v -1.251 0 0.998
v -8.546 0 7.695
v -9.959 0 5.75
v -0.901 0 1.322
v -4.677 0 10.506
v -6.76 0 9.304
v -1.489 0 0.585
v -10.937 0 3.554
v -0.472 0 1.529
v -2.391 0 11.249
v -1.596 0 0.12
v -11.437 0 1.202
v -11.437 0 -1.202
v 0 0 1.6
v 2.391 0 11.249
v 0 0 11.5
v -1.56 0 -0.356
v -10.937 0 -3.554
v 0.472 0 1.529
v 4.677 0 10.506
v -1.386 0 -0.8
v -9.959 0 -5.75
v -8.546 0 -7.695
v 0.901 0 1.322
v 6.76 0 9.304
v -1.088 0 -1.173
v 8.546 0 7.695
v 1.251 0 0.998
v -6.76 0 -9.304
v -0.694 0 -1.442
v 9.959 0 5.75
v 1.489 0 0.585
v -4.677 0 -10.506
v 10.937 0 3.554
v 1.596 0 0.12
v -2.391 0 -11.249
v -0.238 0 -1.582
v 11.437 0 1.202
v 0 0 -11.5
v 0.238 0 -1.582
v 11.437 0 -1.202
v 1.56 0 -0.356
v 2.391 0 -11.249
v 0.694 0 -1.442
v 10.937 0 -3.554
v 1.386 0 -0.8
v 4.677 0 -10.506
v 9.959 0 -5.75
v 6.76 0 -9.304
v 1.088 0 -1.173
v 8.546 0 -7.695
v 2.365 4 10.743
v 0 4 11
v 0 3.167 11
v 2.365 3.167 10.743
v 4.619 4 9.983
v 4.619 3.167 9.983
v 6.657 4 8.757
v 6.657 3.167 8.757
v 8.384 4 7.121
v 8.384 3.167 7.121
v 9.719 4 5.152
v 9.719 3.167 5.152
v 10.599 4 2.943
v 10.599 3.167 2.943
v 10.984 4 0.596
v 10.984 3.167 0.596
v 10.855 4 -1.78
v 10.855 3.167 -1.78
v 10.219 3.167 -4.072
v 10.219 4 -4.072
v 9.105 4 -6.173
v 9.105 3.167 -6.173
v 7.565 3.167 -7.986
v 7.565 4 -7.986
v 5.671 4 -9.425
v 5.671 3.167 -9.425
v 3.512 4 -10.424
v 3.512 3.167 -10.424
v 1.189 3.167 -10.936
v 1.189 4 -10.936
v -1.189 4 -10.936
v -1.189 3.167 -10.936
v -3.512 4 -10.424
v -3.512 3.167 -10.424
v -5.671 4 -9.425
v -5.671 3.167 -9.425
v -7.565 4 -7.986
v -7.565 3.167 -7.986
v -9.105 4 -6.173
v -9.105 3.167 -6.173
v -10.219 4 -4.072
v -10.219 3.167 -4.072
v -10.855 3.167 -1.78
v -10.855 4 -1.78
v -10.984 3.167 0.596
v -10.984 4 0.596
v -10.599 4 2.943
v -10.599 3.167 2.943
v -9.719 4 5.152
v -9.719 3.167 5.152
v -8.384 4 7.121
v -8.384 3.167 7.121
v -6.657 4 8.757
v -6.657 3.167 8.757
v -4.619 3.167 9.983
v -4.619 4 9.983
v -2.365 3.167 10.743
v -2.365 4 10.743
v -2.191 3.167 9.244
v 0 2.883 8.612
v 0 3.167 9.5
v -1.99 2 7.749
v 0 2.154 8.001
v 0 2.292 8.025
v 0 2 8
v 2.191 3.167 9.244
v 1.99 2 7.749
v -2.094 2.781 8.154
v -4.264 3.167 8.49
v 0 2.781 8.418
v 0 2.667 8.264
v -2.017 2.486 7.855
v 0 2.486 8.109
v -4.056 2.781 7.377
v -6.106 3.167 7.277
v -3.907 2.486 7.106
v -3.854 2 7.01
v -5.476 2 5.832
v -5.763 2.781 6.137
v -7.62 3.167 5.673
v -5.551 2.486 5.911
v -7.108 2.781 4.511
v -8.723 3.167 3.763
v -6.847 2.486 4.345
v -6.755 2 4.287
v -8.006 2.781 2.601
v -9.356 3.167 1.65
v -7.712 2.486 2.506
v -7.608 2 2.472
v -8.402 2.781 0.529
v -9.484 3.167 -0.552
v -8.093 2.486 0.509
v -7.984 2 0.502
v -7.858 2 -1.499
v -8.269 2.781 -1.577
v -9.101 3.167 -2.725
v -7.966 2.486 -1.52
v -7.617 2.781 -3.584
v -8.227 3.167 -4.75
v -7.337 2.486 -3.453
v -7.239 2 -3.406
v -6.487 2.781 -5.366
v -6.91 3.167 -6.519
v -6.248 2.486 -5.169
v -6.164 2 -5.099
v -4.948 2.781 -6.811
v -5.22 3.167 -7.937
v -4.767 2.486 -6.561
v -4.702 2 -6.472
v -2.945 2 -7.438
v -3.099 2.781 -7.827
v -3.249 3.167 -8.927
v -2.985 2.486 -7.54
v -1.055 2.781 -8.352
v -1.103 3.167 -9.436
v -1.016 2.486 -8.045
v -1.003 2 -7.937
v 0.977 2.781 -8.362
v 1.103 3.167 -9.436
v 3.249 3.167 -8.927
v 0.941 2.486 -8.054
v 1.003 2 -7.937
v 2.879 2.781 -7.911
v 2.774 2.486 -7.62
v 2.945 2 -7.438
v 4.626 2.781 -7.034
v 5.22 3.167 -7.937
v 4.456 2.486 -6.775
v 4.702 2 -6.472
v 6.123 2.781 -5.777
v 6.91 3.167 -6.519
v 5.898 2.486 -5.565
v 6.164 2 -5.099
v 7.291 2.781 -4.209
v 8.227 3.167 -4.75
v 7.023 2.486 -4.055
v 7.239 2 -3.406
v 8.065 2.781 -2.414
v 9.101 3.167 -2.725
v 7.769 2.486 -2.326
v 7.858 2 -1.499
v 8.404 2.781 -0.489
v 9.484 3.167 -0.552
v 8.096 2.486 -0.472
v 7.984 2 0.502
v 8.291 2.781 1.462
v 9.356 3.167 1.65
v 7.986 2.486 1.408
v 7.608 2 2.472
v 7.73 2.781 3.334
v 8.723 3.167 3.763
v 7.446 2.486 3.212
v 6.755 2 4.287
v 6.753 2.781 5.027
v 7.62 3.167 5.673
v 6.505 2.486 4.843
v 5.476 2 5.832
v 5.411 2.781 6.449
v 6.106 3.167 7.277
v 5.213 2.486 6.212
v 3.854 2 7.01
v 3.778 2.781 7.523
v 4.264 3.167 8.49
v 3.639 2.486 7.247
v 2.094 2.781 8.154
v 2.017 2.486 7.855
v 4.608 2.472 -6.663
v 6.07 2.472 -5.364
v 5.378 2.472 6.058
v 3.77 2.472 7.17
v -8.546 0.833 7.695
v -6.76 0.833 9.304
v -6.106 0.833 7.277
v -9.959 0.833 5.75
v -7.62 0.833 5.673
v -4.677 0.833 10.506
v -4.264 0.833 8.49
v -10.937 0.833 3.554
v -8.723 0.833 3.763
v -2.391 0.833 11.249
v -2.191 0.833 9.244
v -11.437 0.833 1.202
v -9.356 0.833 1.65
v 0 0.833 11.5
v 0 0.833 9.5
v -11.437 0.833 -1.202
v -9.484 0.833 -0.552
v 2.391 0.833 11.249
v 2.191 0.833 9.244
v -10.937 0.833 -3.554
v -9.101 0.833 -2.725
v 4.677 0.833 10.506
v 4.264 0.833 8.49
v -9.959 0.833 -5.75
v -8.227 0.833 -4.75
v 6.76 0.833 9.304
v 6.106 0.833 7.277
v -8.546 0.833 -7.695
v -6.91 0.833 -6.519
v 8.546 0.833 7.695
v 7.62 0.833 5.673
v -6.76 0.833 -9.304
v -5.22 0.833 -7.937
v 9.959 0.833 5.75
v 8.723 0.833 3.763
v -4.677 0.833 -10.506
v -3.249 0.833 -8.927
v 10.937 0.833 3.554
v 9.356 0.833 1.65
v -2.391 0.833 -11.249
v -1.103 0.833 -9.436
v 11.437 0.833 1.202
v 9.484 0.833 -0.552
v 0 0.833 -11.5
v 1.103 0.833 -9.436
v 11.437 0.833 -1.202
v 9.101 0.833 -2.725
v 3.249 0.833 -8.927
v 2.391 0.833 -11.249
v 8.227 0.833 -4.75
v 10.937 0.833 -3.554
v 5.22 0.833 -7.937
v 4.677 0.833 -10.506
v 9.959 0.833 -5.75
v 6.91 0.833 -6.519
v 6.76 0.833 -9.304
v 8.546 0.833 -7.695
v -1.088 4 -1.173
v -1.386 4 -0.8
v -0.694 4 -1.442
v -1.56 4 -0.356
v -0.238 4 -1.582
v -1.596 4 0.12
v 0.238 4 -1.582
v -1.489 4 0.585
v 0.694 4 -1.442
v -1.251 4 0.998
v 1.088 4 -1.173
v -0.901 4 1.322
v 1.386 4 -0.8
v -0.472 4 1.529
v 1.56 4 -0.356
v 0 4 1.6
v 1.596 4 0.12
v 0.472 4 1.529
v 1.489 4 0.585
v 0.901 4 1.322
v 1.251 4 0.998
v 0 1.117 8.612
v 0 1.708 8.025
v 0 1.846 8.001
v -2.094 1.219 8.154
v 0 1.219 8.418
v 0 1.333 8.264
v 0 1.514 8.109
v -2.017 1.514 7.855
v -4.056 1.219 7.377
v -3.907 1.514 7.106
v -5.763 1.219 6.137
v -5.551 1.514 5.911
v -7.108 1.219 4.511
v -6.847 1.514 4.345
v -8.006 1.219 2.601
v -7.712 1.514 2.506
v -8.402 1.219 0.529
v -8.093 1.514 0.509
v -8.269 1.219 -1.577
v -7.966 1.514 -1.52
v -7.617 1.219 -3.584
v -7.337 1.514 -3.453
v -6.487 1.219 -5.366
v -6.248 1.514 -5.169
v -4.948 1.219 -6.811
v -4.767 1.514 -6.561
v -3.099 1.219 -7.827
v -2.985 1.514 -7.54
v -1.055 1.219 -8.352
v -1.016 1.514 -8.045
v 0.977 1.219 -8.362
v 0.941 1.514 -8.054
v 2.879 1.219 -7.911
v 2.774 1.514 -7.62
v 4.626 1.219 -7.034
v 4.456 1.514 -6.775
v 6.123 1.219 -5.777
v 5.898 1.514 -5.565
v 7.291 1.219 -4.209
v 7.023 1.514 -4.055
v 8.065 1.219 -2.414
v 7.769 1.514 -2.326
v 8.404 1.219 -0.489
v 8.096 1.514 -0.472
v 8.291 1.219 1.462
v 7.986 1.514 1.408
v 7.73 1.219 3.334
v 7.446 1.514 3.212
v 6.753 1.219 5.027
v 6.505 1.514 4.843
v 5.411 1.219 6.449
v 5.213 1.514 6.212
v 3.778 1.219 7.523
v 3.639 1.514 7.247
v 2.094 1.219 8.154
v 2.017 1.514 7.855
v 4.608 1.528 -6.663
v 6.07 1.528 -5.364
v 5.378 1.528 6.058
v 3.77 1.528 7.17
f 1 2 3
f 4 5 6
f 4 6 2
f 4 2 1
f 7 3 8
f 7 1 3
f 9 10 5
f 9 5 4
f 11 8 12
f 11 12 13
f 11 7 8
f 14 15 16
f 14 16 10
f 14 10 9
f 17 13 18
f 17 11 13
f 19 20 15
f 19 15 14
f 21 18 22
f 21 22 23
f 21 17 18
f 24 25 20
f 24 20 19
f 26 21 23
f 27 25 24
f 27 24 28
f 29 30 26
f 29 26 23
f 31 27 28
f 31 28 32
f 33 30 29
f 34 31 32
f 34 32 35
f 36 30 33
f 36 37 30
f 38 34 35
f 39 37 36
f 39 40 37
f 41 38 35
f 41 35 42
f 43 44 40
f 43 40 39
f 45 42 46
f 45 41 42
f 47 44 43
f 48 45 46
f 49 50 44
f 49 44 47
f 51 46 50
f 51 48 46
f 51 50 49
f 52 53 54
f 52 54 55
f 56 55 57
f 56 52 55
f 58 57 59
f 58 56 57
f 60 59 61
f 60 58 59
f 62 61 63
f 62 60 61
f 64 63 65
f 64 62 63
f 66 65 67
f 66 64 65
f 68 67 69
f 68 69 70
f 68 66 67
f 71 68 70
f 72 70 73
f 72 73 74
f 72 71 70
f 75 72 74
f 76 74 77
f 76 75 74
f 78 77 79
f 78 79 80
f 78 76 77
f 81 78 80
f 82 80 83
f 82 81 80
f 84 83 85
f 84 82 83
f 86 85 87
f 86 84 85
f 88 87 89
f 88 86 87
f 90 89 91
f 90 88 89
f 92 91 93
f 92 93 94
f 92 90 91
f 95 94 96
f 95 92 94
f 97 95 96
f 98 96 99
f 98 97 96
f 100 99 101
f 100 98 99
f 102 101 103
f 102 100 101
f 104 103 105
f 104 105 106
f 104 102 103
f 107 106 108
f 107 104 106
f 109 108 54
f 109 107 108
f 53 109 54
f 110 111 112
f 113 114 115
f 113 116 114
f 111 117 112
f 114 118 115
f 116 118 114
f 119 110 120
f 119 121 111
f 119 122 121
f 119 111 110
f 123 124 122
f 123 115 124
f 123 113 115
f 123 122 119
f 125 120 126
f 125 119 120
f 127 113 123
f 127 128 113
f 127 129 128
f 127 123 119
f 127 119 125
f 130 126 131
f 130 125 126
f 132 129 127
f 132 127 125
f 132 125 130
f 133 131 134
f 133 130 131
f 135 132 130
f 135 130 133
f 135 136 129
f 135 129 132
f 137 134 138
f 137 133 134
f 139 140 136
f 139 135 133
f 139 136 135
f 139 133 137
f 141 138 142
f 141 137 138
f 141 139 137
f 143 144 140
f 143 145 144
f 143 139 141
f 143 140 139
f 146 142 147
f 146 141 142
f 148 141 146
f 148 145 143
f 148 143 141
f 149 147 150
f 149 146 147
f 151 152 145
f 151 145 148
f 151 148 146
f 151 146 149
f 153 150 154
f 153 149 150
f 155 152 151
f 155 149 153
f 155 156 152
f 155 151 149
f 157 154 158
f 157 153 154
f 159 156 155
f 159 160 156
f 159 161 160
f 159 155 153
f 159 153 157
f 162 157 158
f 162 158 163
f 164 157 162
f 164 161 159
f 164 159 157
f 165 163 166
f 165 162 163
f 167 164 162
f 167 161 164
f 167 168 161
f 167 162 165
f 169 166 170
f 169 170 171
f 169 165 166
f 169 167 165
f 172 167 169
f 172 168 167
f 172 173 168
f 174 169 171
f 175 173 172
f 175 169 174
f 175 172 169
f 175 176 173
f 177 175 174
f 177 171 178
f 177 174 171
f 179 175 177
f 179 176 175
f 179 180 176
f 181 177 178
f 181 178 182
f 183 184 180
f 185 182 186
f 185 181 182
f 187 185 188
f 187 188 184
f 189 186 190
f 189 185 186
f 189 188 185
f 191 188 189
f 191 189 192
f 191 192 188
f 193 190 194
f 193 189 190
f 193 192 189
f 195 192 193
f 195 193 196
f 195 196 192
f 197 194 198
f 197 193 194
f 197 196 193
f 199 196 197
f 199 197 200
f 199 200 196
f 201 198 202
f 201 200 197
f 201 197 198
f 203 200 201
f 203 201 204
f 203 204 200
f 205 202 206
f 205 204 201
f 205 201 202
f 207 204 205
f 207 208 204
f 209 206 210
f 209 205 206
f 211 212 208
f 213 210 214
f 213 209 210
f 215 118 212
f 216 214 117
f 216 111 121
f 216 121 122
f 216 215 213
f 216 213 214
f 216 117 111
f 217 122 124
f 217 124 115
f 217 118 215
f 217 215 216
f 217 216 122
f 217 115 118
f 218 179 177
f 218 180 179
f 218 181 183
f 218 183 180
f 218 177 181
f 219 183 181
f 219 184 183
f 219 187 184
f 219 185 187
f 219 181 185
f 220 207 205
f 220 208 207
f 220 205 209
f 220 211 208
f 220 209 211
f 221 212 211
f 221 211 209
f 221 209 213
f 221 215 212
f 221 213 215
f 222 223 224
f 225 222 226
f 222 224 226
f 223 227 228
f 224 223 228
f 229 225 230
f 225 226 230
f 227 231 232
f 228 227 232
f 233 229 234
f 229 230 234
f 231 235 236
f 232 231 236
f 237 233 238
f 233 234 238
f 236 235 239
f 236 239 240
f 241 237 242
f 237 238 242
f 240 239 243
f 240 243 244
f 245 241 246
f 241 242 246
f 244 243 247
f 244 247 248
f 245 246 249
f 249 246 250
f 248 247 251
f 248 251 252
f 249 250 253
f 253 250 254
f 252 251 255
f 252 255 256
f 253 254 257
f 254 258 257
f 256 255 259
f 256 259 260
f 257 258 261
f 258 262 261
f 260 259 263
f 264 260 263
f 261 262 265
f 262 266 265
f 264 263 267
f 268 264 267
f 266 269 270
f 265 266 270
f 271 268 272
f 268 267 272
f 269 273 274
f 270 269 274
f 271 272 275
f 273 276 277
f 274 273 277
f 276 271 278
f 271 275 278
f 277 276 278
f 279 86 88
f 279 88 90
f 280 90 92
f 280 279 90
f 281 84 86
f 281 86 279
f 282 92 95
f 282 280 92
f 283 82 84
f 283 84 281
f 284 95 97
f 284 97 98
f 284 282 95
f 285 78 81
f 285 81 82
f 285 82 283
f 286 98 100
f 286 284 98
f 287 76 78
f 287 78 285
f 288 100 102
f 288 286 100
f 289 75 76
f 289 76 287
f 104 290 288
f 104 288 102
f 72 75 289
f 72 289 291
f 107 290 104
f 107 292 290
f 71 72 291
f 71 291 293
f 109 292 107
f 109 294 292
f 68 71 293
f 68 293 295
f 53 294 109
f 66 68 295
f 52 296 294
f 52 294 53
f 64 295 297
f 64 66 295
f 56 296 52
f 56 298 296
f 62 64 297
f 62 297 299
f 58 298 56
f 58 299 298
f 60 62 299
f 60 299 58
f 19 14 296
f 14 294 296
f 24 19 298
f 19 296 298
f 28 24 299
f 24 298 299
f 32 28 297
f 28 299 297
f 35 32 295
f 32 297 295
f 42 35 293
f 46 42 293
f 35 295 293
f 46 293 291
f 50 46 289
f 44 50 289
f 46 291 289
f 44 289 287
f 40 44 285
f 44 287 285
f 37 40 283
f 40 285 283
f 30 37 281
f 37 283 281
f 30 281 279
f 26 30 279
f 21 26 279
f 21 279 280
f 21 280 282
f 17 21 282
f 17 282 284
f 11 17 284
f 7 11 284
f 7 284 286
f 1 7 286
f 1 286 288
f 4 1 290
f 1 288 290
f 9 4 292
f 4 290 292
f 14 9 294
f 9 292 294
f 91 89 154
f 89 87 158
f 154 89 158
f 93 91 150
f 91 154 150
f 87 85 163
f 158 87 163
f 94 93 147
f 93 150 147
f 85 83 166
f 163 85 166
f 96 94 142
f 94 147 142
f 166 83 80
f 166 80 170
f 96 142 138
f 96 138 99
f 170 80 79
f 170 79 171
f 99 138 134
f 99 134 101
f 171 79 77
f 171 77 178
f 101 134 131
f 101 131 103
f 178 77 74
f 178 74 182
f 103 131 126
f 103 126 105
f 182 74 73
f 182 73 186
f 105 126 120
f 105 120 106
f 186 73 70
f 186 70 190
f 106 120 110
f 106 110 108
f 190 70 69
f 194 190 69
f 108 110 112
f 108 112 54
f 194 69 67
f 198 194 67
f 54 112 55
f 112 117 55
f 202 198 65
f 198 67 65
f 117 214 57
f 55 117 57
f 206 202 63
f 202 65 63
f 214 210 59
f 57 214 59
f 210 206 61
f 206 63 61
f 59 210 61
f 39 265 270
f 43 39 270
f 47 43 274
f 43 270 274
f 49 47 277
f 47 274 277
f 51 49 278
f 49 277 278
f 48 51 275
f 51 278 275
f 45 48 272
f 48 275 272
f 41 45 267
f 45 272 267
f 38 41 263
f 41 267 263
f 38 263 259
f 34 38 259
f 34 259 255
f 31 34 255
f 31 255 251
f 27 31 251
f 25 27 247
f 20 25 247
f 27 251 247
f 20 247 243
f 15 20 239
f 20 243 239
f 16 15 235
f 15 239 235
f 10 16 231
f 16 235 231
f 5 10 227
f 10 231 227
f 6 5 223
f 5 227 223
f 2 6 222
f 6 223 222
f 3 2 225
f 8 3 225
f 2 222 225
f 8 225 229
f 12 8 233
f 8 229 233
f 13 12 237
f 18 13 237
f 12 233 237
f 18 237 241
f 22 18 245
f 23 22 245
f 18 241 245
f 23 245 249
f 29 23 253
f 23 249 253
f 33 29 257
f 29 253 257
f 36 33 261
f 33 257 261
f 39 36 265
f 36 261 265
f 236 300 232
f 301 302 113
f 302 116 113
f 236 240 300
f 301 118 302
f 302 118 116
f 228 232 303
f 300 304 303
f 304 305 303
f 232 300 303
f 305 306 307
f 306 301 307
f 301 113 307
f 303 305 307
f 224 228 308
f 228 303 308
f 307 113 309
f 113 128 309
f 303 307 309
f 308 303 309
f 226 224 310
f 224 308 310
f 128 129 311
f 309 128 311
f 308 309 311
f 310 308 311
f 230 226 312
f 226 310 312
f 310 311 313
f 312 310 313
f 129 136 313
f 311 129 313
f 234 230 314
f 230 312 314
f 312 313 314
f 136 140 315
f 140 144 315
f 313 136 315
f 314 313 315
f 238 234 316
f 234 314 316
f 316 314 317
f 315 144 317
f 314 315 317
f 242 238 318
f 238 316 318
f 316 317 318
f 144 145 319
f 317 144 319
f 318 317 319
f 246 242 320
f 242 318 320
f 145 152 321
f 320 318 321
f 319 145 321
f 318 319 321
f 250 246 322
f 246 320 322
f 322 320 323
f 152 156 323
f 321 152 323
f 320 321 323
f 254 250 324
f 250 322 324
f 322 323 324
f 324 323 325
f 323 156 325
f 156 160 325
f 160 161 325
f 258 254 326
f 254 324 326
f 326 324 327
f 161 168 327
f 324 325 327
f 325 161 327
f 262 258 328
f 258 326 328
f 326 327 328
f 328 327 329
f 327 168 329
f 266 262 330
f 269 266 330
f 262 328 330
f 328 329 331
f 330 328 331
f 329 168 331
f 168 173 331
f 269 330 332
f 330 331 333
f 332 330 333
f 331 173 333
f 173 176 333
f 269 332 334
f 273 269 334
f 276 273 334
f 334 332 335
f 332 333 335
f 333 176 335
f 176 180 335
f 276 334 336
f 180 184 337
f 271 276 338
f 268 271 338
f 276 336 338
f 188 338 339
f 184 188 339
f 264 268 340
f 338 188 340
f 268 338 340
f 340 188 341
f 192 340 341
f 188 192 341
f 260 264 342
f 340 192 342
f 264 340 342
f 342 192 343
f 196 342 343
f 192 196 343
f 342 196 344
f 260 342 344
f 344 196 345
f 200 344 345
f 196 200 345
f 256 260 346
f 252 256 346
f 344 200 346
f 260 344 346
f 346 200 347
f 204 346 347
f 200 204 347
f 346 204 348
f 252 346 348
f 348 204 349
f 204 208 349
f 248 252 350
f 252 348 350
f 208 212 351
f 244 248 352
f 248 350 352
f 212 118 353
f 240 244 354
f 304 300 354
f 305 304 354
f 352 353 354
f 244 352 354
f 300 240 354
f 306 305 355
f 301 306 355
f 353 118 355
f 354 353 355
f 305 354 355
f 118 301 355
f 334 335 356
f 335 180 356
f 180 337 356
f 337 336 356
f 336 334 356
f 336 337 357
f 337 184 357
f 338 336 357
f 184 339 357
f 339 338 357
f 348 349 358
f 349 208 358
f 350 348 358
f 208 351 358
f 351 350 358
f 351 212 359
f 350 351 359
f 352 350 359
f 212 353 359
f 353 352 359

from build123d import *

# Parameters (mm, degrees)
SKETCH1_R           = 9.5
BOSS_EXTRUDE1_DEPTH = 4
SKETCH3_R           = 1.6
CUT_EXTRUDE1_DEPTH  = 15.017845904
SKETCH4_R           = 11
SKETCH4_R_2         = 1.6
EXTENSION_TOP_DEPTH = 0.832825
BOSS_EXTRUDE4_START = -0.832825
SKETCH5_R           = 11.5
SKETCH5_R_2         = 1.6
BOSS_EXTRUDE4_DEPTH = 0.832825


with BuildPart() as part:
    # Sketch1 → Boss-Extrude1 (new body)
    with BuildSketch(Plane(origin=(0, 0, 0), x_dir=(1, 0, 0), z_dir=(0, 1, 0))):
        with Locations(Location((0, 0, 0), (0, 0, 270))):
            Circle(SKETCH1_R)
    extrude(amount=BOSS_EXTRUDE1_DEPTH)

    # Sketch2 → Cut-Revolve3 (revolve, cut)
    with BuildSketch(Plane.XY, mode=Mode.PRIVATE) as cut_revolve3_sk:
        with BuildLine():
            Line((-9.5, 3.167174781), (-9.5, 0.832825219))
            add(Edge.make_bspline(
                [(-9.5, 0.832825219), (-8.911003923, 1.01519245), (-7.940181452, 1.15692307), (-8, 2)],
                knots=[0, 0, 0, 0, 1, 1, 1, 1], degree=3))
            add(Edge.make_bspline(
                [(-9.5, 3.167174781), (-8.911003923, 2.98480755), (-7.940181452, 2.84307693), (-8, 2)],
                knots=[0, 0, 0, 0, 1, 1, 1, 1], degree=3))
        make_face()
    revolve(cut_revolve3_sk.sketch.rotate(Axis((0, 4.2, 0), (0, -1, 0)), 270), axis=Axis((0, 4.2, 0), (0, -1, 0)), mode=Mode.SUBTRACT)

    # Sketch3 → Cut-Extrude1 (cut, through all)
    with BuildSketch(Plane(origin=(0, 4, 0), x_dir=(1, 0, 0), z_dir=(0, 1, 0))):
        with Locations(Location((0, 0, 0), (0, 0, 270))):
            Circle(SKETCH3_R)
    extrude(amount=-CUT_EXTRUDE1_DEPTH, mode=Mode.SUBTRACT)

    # Sketch4 → Extension top (add)
    with BuildSketch(Plane(origin=(0, 4, 0), x_dir=(1, 0, 0), z_dir=(0, 1, 0))):
        with Locations(Location((0, 0, 0), (0, 0, 270))):
            Circle(SKETCH4_R)
        with Locations(Location((0, 0, 0), (0, 0, 270))):
            Circle(SKETCH4_R_2, mode=Mode.SUBTRACT)
    extrude(amount=-EXTENSION_TOP_DEPTH)

    # Sketch5 → Boss-Extrude4 (add)
    with BuildSketch(Plane.XZ.offset(BOSS_EXTRUDE4_START)):
        with Locations(Location((0, 0, 0), (0, 0, 270))):
            Circle(SKETCH5_R)
        with Locations(Location((0, 0, 0), (0, 0, 90))):
            Circle(SKETCH5_R_2, mode=Mode.SUBTRACT)
    extrude(amount=BOSS_EXTRUDE4_DEPTH)


solid = part.part
